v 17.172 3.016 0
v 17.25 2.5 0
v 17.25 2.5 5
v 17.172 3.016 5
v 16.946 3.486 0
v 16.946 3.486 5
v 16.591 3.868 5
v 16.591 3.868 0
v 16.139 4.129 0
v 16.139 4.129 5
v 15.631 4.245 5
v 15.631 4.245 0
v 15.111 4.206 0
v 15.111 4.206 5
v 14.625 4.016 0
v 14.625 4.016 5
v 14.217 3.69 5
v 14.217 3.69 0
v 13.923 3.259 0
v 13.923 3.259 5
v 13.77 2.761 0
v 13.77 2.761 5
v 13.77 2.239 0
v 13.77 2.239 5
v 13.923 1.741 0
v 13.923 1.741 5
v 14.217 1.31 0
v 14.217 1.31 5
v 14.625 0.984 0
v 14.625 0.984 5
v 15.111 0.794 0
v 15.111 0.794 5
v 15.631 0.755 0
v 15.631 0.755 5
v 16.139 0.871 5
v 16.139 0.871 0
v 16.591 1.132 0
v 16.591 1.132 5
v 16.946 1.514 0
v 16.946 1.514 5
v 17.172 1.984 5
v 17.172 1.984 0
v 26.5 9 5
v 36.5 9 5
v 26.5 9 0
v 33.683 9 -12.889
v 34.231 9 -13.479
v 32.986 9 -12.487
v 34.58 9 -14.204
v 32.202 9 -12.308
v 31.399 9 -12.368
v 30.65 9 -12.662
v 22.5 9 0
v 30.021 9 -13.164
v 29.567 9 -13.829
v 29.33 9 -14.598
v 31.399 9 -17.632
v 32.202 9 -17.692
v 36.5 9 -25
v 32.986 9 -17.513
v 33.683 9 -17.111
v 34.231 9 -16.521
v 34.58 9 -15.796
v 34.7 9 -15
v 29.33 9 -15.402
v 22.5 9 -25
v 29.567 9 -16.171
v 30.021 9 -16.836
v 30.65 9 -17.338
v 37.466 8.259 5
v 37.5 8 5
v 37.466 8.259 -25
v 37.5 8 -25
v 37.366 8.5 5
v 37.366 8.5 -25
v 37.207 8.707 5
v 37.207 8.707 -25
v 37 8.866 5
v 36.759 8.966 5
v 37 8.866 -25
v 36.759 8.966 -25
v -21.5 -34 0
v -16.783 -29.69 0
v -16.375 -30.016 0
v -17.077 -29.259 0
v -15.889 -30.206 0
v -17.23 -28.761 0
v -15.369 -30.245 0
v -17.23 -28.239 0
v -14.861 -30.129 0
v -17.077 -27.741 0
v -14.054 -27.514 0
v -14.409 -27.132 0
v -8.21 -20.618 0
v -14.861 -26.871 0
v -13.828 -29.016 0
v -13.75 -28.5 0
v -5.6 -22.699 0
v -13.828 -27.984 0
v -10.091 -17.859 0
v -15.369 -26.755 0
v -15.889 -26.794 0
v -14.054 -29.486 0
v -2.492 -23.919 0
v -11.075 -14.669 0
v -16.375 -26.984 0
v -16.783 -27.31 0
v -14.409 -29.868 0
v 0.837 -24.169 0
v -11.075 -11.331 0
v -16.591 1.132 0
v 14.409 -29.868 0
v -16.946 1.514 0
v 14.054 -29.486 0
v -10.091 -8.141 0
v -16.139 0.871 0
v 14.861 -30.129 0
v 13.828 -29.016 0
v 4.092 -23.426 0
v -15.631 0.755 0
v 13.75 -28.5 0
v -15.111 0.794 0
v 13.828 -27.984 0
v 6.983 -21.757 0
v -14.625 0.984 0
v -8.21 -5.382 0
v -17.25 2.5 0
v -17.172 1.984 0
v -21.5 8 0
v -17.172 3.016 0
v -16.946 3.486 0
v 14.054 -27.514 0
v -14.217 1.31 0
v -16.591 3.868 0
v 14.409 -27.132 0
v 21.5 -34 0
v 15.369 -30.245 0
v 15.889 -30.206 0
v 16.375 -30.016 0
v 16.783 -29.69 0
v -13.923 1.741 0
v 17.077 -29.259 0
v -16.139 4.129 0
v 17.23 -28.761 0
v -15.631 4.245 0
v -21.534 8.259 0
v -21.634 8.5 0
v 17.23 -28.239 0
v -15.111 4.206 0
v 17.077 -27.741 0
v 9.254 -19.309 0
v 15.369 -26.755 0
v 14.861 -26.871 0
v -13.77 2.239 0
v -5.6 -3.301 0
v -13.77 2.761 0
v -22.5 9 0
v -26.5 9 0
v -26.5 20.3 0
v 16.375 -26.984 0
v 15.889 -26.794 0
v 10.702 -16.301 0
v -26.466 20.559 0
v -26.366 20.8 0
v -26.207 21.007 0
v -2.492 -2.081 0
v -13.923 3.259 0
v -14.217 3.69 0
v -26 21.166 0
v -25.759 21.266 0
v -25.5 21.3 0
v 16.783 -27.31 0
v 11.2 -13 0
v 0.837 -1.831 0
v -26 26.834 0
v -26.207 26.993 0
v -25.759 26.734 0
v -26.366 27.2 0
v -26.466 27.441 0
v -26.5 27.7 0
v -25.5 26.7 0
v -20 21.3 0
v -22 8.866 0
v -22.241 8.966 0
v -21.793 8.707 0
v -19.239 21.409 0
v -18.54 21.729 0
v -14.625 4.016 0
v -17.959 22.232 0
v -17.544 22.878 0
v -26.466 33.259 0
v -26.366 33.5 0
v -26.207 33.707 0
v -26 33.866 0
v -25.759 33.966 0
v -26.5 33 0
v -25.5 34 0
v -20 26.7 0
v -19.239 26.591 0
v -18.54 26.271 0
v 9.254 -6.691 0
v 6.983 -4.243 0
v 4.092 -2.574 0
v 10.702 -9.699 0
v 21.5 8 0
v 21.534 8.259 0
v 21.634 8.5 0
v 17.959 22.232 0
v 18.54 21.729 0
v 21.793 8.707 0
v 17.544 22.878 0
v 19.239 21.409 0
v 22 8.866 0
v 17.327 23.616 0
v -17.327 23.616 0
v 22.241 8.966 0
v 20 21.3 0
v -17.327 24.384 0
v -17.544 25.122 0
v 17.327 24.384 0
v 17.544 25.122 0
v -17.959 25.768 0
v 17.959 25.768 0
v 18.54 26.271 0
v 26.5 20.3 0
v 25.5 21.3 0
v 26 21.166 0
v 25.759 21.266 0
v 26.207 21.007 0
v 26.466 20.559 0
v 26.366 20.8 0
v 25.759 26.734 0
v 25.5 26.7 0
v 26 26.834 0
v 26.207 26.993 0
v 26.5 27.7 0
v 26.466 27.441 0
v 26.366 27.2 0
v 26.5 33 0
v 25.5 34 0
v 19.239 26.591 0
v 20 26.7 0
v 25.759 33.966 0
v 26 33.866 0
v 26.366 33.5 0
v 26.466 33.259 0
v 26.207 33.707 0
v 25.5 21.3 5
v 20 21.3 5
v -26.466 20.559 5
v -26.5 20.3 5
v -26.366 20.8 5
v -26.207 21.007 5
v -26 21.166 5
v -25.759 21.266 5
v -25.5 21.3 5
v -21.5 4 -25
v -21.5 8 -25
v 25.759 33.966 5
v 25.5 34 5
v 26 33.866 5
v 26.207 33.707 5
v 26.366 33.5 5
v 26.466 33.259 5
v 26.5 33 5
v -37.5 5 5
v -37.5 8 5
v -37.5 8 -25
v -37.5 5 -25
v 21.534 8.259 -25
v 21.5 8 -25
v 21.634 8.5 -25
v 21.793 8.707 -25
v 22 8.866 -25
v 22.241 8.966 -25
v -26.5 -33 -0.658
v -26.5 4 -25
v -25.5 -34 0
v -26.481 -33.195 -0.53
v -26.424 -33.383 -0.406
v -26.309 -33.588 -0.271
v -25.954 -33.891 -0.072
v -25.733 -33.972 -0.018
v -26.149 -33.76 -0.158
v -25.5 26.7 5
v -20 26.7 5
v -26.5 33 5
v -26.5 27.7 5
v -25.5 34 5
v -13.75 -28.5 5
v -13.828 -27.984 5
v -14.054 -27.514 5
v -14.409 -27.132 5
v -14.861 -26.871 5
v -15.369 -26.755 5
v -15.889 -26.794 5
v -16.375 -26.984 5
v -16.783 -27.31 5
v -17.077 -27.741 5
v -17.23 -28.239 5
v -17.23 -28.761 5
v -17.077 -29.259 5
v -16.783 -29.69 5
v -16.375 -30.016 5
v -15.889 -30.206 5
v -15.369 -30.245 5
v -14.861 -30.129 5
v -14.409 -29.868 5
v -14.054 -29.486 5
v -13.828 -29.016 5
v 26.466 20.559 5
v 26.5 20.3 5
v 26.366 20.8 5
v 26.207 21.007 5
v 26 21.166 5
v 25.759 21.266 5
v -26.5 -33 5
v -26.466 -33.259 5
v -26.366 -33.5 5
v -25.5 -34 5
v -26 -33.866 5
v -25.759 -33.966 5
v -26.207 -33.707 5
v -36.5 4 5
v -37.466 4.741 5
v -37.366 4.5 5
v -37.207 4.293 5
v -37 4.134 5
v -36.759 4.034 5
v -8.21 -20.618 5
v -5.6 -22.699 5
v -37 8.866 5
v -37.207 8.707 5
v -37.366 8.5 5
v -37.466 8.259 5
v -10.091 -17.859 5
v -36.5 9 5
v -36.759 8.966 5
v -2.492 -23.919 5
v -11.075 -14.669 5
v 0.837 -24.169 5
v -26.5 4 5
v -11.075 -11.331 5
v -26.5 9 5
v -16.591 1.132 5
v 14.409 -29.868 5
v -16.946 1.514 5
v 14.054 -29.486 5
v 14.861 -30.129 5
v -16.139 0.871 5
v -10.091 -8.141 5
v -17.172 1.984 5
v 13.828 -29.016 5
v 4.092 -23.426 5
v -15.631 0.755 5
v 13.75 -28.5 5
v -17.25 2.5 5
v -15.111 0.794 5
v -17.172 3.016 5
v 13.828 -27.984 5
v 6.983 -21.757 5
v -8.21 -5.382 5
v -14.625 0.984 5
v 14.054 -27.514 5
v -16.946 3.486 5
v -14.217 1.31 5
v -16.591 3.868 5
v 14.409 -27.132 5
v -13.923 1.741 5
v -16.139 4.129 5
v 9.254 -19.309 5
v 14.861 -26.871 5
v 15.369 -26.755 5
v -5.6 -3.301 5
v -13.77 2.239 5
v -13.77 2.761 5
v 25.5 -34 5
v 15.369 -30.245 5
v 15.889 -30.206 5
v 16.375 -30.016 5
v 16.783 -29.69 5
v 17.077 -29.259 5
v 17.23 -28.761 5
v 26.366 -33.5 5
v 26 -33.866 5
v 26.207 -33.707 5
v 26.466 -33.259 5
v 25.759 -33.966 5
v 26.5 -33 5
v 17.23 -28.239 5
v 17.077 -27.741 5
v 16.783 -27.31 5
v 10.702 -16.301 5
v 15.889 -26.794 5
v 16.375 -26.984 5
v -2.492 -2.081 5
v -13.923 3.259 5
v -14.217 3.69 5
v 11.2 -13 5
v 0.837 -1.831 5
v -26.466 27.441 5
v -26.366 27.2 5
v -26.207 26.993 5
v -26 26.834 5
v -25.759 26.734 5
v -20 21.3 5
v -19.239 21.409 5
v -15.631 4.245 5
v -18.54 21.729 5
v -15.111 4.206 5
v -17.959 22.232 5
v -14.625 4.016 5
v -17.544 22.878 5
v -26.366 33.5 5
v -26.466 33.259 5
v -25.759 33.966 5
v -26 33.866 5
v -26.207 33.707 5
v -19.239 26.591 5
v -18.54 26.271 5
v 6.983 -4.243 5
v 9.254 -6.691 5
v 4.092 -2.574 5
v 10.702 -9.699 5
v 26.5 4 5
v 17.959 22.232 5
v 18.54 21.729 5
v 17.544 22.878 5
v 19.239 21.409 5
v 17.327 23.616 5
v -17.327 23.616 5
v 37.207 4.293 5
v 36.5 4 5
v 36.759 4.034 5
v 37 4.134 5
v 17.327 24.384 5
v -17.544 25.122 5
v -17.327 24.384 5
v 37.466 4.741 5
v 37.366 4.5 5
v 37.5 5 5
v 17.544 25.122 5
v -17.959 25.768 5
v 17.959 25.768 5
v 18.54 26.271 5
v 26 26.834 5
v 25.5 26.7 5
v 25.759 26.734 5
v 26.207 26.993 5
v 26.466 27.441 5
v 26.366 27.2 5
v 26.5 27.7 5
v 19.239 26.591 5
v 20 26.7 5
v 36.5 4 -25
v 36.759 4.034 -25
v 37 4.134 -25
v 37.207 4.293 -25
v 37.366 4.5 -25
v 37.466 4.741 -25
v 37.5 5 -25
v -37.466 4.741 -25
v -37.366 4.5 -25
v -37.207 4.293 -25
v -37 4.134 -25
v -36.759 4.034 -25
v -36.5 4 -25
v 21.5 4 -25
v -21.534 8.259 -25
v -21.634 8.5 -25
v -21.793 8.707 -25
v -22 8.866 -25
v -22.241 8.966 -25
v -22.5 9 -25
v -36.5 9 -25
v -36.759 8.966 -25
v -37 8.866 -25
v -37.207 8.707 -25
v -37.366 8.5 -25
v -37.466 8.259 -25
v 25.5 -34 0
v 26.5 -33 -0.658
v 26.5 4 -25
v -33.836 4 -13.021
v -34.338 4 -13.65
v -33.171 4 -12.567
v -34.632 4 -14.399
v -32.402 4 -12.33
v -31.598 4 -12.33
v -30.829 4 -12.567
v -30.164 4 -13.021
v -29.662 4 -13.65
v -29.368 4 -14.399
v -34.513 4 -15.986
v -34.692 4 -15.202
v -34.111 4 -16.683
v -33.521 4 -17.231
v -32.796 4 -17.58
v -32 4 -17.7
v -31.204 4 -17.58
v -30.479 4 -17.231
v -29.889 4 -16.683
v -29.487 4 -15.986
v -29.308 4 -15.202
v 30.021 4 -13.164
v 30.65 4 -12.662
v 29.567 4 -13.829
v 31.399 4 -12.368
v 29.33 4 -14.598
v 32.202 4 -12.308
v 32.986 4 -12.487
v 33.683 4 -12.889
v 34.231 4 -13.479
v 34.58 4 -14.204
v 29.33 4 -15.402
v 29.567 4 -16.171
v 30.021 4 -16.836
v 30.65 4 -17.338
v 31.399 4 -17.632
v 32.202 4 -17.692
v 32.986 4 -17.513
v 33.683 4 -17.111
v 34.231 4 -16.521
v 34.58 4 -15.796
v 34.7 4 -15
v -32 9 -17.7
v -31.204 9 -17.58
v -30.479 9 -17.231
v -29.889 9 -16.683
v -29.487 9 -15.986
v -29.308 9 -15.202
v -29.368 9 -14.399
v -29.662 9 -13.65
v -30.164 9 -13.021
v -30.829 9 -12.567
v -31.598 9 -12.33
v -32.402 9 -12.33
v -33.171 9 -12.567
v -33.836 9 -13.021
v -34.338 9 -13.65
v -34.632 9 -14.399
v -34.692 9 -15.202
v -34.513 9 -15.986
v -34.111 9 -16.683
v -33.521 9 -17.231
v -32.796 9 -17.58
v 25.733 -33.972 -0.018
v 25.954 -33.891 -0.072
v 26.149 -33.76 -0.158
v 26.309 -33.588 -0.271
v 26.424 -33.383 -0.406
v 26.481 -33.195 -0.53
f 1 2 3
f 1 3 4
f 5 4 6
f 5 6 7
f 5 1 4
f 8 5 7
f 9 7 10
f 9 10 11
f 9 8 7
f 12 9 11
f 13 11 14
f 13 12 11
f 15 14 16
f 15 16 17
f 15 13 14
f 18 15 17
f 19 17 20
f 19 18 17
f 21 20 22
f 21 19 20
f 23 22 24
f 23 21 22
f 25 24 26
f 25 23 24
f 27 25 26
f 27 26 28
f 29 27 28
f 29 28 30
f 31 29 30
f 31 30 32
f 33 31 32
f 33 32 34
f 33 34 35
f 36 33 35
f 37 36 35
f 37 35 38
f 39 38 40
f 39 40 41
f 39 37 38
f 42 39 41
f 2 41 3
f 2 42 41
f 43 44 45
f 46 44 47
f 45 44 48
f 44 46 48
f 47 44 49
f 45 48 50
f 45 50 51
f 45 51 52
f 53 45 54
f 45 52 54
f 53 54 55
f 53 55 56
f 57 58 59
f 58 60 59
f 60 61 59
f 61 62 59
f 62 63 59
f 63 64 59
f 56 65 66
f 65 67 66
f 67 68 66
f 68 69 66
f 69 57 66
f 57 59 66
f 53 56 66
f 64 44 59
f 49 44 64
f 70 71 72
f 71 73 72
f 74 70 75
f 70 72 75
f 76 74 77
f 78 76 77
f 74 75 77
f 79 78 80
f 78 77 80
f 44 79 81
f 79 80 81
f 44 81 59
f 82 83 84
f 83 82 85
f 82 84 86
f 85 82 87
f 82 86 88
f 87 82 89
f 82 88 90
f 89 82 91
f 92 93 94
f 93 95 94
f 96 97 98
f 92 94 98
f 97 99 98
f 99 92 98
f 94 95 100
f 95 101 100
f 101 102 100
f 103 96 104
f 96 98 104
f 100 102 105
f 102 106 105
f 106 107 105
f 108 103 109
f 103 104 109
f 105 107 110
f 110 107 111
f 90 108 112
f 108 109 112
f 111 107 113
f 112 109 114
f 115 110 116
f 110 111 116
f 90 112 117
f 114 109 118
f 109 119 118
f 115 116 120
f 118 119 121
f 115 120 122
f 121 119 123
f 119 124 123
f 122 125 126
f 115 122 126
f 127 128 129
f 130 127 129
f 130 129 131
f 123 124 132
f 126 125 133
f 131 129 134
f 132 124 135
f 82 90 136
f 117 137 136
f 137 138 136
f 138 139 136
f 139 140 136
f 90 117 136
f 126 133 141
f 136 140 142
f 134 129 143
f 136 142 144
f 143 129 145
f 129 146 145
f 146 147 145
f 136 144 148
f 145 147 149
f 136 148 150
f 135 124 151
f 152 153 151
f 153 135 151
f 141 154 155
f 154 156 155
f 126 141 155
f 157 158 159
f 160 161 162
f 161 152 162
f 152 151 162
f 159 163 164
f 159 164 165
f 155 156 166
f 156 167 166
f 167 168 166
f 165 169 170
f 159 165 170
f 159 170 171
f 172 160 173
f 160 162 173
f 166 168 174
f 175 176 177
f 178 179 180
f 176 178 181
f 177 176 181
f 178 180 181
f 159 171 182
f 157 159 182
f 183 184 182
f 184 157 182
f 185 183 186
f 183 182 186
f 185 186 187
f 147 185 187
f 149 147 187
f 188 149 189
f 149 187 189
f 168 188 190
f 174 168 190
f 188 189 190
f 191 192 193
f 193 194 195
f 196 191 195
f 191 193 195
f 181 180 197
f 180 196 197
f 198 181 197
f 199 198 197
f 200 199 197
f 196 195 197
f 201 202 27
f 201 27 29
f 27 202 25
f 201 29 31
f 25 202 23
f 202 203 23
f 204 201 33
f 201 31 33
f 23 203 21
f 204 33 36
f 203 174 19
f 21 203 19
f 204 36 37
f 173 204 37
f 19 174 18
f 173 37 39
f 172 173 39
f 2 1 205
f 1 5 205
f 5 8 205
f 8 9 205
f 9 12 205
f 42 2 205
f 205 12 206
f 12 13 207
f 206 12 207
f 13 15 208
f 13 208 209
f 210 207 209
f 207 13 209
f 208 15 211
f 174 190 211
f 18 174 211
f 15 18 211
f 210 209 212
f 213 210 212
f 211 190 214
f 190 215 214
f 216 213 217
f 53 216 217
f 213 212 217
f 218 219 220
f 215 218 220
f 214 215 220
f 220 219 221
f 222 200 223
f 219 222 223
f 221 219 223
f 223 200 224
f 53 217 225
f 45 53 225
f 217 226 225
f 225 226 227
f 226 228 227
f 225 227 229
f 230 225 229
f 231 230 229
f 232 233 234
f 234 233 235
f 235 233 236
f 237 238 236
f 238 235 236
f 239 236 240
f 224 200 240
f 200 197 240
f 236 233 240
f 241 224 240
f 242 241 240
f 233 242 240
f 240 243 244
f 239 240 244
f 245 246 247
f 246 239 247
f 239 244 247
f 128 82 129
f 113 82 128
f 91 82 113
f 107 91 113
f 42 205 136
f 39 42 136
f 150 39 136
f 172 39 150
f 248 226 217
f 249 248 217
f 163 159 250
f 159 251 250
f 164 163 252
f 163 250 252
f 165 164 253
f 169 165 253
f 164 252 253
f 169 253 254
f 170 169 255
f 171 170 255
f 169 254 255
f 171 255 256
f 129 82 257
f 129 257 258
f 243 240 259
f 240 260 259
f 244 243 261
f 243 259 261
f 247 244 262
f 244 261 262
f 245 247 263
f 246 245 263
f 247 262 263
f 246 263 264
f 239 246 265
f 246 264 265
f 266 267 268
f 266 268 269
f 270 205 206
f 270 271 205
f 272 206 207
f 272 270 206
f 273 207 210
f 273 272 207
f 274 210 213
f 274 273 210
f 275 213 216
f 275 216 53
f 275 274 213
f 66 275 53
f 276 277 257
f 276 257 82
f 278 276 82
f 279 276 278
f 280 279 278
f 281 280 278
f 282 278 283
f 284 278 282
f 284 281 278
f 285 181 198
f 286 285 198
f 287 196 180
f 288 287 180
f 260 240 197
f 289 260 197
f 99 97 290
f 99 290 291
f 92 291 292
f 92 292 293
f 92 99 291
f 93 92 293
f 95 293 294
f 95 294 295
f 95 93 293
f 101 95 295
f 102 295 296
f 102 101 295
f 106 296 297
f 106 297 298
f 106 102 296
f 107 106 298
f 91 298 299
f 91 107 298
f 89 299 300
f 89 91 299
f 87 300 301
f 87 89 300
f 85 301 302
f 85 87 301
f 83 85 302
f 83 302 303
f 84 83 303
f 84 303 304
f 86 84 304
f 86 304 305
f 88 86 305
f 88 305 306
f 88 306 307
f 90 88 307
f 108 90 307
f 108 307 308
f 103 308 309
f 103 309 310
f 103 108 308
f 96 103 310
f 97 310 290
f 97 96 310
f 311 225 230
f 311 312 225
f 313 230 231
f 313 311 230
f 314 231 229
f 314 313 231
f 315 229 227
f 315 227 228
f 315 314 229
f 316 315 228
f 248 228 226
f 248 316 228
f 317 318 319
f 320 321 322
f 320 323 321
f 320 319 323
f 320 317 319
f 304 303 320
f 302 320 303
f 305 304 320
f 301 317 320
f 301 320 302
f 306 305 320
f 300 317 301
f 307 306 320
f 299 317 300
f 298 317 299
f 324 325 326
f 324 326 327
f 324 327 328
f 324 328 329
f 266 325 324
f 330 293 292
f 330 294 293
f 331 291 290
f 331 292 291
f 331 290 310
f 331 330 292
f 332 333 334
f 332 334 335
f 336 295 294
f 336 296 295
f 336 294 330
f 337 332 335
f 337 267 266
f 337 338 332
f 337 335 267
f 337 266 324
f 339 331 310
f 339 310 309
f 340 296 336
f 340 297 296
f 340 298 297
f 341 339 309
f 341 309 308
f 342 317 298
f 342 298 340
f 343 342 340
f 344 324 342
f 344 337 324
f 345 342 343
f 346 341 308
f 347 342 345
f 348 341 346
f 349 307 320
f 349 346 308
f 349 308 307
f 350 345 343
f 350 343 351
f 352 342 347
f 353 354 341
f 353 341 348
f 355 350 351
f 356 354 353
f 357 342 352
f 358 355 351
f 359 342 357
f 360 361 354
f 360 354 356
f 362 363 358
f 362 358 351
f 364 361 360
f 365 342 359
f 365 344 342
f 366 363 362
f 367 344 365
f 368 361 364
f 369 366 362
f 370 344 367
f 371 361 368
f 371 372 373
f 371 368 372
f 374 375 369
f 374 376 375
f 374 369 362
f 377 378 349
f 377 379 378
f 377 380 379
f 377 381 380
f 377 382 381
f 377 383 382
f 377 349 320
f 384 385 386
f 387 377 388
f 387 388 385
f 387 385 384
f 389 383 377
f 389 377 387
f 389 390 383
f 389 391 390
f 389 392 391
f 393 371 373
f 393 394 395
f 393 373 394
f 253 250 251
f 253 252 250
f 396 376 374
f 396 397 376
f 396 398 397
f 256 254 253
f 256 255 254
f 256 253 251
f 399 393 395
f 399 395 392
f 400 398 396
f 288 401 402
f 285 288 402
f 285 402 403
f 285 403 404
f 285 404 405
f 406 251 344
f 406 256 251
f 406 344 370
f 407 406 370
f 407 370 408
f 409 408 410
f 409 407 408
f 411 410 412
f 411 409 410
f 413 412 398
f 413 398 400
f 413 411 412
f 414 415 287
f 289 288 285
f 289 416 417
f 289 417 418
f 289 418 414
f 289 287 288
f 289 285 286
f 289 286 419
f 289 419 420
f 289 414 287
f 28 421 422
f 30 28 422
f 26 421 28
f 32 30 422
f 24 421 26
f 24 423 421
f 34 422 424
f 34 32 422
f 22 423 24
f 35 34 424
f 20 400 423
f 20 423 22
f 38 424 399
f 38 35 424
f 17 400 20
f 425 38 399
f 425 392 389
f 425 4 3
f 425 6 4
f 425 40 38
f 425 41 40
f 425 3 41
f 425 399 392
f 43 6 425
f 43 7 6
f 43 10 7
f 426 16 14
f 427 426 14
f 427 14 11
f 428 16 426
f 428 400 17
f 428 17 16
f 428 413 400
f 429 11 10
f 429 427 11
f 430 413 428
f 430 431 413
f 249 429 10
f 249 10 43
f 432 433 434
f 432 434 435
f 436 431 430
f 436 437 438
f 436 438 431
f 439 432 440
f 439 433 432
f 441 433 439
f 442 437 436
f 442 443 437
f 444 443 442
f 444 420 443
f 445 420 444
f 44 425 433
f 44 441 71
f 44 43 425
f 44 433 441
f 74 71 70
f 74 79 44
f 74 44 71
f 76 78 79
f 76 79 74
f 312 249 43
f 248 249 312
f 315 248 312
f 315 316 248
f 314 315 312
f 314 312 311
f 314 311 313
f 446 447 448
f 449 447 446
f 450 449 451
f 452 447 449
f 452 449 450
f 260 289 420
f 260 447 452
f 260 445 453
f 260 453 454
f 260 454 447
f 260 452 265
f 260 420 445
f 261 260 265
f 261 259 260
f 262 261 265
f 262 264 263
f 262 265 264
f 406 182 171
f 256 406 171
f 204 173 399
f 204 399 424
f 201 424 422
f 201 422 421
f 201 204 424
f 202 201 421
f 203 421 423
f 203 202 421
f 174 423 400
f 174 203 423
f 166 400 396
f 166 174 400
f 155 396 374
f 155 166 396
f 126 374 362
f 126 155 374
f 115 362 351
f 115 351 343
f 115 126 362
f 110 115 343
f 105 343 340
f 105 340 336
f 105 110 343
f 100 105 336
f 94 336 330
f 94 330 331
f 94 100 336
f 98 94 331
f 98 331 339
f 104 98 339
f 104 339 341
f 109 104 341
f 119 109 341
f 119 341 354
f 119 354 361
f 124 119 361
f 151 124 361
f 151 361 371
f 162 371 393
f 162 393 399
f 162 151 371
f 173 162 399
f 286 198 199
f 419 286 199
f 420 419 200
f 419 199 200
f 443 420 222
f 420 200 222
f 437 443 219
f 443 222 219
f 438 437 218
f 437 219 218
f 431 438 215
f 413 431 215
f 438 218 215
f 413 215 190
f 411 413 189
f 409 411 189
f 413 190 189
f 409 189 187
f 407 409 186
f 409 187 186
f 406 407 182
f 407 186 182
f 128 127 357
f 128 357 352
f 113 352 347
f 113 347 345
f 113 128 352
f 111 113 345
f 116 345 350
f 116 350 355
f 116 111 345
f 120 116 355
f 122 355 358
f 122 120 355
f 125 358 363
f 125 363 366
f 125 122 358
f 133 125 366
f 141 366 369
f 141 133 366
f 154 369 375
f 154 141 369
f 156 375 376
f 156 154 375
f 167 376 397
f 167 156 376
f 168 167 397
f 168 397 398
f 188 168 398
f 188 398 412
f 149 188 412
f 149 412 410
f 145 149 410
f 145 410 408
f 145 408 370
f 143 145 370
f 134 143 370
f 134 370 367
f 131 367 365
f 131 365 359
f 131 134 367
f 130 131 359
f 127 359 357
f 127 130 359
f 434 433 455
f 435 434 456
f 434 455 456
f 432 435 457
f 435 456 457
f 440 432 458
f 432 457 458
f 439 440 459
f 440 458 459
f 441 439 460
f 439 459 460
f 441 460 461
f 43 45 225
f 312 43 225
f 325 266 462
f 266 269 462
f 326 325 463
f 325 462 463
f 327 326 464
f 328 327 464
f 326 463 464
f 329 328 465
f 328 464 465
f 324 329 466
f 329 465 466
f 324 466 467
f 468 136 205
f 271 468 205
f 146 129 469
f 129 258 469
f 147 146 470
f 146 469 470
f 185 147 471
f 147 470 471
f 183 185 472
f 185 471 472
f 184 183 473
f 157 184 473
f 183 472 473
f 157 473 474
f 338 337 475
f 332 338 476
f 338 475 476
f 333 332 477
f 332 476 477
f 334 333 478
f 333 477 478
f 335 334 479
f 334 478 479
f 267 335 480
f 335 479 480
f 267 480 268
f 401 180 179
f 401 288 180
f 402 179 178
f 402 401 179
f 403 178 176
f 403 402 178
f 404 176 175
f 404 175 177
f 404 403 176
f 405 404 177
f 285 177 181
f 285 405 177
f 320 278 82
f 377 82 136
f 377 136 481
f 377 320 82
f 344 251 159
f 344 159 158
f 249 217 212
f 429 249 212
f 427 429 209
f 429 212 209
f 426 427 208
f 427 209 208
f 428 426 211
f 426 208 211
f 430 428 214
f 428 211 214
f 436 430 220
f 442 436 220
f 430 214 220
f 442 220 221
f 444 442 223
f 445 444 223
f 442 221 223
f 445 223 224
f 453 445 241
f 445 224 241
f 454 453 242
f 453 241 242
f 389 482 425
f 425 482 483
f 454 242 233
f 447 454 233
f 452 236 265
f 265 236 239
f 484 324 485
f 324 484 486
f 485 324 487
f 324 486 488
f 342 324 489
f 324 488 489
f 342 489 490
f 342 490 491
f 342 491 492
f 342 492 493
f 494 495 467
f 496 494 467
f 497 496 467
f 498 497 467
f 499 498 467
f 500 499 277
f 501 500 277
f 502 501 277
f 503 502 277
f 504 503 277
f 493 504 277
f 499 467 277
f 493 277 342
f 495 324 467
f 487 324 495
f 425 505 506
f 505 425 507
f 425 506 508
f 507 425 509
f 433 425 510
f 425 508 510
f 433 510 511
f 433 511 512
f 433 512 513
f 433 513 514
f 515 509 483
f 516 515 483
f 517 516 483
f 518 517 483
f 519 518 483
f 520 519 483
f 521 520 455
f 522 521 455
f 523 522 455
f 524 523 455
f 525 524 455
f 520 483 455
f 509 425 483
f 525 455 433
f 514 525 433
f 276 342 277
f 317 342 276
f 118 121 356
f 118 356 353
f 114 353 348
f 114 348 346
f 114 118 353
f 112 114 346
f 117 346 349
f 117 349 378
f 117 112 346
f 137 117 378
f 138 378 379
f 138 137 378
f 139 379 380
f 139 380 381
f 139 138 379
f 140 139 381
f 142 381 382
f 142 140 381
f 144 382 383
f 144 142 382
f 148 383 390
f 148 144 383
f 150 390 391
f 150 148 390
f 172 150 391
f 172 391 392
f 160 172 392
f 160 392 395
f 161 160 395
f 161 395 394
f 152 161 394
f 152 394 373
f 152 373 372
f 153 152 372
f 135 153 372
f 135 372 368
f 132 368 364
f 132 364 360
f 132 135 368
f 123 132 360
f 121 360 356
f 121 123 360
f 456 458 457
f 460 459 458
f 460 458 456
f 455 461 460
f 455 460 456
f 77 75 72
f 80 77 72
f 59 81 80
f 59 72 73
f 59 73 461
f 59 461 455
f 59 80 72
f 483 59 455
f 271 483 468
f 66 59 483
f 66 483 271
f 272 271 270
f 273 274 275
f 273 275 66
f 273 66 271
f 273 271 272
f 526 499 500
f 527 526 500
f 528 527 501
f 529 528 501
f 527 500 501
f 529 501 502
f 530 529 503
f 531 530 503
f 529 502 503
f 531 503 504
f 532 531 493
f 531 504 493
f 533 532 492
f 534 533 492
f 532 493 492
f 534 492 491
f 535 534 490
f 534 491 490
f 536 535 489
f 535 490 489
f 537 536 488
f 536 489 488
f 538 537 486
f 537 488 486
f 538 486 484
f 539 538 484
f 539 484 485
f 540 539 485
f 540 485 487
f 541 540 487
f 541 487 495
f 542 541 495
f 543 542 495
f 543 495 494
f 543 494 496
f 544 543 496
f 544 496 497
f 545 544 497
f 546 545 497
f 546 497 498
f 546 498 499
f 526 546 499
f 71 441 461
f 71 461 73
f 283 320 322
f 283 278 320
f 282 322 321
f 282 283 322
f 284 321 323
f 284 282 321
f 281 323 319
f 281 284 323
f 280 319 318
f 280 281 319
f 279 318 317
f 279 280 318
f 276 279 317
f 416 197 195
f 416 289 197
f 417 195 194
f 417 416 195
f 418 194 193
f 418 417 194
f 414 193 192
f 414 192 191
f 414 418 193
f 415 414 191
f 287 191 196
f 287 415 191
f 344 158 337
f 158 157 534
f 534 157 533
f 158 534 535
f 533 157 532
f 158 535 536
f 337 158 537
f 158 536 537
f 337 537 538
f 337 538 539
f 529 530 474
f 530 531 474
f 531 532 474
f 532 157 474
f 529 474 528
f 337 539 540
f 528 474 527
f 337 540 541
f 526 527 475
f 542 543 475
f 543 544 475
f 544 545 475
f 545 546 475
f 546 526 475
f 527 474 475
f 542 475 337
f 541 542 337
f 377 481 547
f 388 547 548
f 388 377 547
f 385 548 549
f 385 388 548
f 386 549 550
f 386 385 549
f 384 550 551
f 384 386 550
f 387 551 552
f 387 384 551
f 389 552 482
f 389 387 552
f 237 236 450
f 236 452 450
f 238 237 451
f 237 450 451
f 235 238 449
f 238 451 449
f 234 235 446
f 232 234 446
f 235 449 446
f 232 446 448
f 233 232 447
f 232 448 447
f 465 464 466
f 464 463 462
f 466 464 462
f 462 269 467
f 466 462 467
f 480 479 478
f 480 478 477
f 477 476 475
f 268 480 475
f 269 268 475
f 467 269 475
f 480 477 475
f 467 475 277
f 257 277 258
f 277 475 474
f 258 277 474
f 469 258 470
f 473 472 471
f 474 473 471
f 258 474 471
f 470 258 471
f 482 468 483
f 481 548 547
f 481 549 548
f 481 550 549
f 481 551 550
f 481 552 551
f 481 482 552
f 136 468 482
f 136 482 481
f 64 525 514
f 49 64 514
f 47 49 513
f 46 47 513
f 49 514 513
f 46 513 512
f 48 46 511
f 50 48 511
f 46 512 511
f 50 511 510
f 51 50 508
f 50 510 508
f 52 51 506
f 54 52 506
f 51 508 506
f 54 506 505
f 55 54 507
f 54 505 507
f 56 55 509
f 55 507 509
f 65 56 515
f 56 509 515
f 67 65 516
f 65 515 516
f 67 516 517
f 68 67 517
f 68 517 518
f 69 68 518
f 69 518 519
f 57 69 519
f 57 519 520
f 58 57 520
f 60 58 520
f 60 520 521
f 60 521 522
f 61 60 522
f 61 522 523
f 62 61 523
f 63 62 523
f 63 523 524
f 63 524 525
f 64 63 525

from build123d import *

# Parameters (mm, degrees)
SKETCH1_R           = 11.2
SKETCH1_R_2         = 1.75
BOSS_EXTRUDE1_DEPTH = 5
BOSS_EXTRUDE2_DEPTH = 25
CUT_EXTRUDE1_DEPTH  = 77.661594035
SKETCH4_R           = 2.7
CUT_EXTRUDE2_DEPTH  = 25
FILLET1_R           = 1
BOSS_EXTRUDE3_DEPTH = 5
BOSS_EXTRUDE4_DEPTH = 5


with BuildPart() as part:
    # Sketch1 → Boss-Extrude1 (new body)
    with BuildSketch(Plane.XY):
        with BuildLine():
            Line((26.5, 34), (-26.5, 34))
            Line((-26.5, 34), (-26.5, 26.7))
            Line((-26.5, 26.7), (-20, 26.7))
            ThreePointArc((-20, 26.7), (-17.3, 24), (-20, 21.3))
            Line((-20, 21.3), (-26.5, 21.3))
            Line((-26.5, 21.3), (-26.5, -34))
            Line((-26.5, -34), (26.5, -34))
            Line((26.5, -34), (26.5, 21.3))
            Line((26.5, 21.3), (20, 21.3))
            ThreePointArc((20, 21.3), (17.3, 24), (20, 26.7))
            Line((20, 26.7), (26.5, 26.7))
            Line((26.5, 26.7), (26.5, 34))
        make_face()
        with Locations((0, -13)):
            Circle(SKETCH1_R, mode=Mode.SUBTRACT)
        with Locations((15.5, 2.5)):
            Circle(SKETCH1_R_2, mode=Mode.SUBTRACT)
        with Locations(Location((15.5, -28.5, 0), (0, 0, 180))):
            Circle(SKETCH1_R_2, mode=Mode.SUBTRACT)
        with Locations(Location((-15.5, 2.5, 0), (0, 0, 180))):
            Circle(SKETCH1_R_2, mode=Mode.SUBTRACT)
        with Locations((-15.5, -28.5)):
            Circle(SKETCH1_R_2, mode=Mode.SUBTRACT)
    extrude(amount=BOSS_EXTRUDE1_DEPTH)

    # Sketch2 → Boss-Extrude2 (add)
    with BuildSketch(Plane(origin=(0, 0, 0), x_dir=(-1, 0, 0), z_dir=(0, 0, -1))):
        Polygon((26.5, -34), (21.5, -34), (21.5, 9), (37.5, 9), (37.5, 4), (26.5, 4), align=None)
        Polygon((-26.5, 4), (-26.5, -34), (-21.5, -34), (-21.5, 9), (-37.5, 9), (-37.5, 4), align=None)
    extrude(amount=BOSS_EXTRUDE2_DEPTH)

    # Sketch3 → Cut-Extrude1 (cut, through all)
    with BuildSketch(Plane.ZY.offset(26.5)):
        Polygon((-25, 4), (0, -34), (-25, -34), align=None)
    extrude(amount=-CUT_EXTRUDE1_DEPTH, mode=Mode.SUBTRACT)

    # Sketch4 → Cut-Extrude2 (cut)
    with BuildSketch(Plane.XZ.offset(-4)):
        with Locations((32, -15)):
            Circle(SKETCH4_R)
        with Locations(Location((-32, -15, 0), (0, 0, 270))):
            Circle(SKETCH4_R)
    extrude(amount=-CUT_EXTRUDE2_DEPTH, mode=Mode.SUBTRACT)

    # Fillet1
    fillet1_edges = [part.edges().sort_by_distance(p)[0] for p in [
        (-26.5, 21.3, 2.5),
        (-26.5, 26.7, 2.5),
        (26.5, 21.3, 2.5),
        (26.5, 26.7, 2.5),
        (26.5, 34, 2.5),
        (26.5, -34, 2.5),
        (-26.5, -34, 2.5),
        (-26.5, 34, 2.5),
        (-37.5, 4, -12.5),
        (-37.5, 9, -12.5),
        (-21.5, 9, -12.5),
        (21.5, 9, -12.5),
        (37.5, 4, -12.5),
        (37.5, 9, -12.5),
    ]]
    fillet(fillet1_edges, radius=FILLET1_R)

    # Sketch5 → Boss-Extrude3 (add)
    with BuildSketch(Plane.XY):
        with BuildLine():
            Line((26.5, 4), (36.5, 4))
            ThreePointArc((36.5, 4), (37.207106781, 4.292893219), (37.5, 5))
            Line((37.5, 5), (37.5, 8))
            ThreePointArc((37.5, 8), (37.207106781, 8.707106781), (36.5, 9))
            Line((36.5, 9), (26.5, 9))
            Line((26.5, 9), (26.5, 4))
        make_face()
    extrude(amount=BOSS_EXTRUDE3_DEPTH)

    # Sketch6 → Boss-Extrude4 (add)
    with BuildSketch(Plane.XY):
        with BuildLine():
            Line((-37.5, 8), (-37.5, 5))
            ThreePointArc((-37.5, 5), (-37.207106781, 4.292893219), (-36.5, 4))
            Line((-36.5, 4), (-26.5, 4))
            Line((-26.5, 4), (-26.5, 9))
            Line((-26.5, 9), (-36.5, 9))
            ThreePointArc((-36.5, 9), (-37.207106781, 8.707106781), (-37.5, 8))
        make_face()
    extrude(amount=BOSS_EXTRUDE4_DEPTH)


solid = part.part
